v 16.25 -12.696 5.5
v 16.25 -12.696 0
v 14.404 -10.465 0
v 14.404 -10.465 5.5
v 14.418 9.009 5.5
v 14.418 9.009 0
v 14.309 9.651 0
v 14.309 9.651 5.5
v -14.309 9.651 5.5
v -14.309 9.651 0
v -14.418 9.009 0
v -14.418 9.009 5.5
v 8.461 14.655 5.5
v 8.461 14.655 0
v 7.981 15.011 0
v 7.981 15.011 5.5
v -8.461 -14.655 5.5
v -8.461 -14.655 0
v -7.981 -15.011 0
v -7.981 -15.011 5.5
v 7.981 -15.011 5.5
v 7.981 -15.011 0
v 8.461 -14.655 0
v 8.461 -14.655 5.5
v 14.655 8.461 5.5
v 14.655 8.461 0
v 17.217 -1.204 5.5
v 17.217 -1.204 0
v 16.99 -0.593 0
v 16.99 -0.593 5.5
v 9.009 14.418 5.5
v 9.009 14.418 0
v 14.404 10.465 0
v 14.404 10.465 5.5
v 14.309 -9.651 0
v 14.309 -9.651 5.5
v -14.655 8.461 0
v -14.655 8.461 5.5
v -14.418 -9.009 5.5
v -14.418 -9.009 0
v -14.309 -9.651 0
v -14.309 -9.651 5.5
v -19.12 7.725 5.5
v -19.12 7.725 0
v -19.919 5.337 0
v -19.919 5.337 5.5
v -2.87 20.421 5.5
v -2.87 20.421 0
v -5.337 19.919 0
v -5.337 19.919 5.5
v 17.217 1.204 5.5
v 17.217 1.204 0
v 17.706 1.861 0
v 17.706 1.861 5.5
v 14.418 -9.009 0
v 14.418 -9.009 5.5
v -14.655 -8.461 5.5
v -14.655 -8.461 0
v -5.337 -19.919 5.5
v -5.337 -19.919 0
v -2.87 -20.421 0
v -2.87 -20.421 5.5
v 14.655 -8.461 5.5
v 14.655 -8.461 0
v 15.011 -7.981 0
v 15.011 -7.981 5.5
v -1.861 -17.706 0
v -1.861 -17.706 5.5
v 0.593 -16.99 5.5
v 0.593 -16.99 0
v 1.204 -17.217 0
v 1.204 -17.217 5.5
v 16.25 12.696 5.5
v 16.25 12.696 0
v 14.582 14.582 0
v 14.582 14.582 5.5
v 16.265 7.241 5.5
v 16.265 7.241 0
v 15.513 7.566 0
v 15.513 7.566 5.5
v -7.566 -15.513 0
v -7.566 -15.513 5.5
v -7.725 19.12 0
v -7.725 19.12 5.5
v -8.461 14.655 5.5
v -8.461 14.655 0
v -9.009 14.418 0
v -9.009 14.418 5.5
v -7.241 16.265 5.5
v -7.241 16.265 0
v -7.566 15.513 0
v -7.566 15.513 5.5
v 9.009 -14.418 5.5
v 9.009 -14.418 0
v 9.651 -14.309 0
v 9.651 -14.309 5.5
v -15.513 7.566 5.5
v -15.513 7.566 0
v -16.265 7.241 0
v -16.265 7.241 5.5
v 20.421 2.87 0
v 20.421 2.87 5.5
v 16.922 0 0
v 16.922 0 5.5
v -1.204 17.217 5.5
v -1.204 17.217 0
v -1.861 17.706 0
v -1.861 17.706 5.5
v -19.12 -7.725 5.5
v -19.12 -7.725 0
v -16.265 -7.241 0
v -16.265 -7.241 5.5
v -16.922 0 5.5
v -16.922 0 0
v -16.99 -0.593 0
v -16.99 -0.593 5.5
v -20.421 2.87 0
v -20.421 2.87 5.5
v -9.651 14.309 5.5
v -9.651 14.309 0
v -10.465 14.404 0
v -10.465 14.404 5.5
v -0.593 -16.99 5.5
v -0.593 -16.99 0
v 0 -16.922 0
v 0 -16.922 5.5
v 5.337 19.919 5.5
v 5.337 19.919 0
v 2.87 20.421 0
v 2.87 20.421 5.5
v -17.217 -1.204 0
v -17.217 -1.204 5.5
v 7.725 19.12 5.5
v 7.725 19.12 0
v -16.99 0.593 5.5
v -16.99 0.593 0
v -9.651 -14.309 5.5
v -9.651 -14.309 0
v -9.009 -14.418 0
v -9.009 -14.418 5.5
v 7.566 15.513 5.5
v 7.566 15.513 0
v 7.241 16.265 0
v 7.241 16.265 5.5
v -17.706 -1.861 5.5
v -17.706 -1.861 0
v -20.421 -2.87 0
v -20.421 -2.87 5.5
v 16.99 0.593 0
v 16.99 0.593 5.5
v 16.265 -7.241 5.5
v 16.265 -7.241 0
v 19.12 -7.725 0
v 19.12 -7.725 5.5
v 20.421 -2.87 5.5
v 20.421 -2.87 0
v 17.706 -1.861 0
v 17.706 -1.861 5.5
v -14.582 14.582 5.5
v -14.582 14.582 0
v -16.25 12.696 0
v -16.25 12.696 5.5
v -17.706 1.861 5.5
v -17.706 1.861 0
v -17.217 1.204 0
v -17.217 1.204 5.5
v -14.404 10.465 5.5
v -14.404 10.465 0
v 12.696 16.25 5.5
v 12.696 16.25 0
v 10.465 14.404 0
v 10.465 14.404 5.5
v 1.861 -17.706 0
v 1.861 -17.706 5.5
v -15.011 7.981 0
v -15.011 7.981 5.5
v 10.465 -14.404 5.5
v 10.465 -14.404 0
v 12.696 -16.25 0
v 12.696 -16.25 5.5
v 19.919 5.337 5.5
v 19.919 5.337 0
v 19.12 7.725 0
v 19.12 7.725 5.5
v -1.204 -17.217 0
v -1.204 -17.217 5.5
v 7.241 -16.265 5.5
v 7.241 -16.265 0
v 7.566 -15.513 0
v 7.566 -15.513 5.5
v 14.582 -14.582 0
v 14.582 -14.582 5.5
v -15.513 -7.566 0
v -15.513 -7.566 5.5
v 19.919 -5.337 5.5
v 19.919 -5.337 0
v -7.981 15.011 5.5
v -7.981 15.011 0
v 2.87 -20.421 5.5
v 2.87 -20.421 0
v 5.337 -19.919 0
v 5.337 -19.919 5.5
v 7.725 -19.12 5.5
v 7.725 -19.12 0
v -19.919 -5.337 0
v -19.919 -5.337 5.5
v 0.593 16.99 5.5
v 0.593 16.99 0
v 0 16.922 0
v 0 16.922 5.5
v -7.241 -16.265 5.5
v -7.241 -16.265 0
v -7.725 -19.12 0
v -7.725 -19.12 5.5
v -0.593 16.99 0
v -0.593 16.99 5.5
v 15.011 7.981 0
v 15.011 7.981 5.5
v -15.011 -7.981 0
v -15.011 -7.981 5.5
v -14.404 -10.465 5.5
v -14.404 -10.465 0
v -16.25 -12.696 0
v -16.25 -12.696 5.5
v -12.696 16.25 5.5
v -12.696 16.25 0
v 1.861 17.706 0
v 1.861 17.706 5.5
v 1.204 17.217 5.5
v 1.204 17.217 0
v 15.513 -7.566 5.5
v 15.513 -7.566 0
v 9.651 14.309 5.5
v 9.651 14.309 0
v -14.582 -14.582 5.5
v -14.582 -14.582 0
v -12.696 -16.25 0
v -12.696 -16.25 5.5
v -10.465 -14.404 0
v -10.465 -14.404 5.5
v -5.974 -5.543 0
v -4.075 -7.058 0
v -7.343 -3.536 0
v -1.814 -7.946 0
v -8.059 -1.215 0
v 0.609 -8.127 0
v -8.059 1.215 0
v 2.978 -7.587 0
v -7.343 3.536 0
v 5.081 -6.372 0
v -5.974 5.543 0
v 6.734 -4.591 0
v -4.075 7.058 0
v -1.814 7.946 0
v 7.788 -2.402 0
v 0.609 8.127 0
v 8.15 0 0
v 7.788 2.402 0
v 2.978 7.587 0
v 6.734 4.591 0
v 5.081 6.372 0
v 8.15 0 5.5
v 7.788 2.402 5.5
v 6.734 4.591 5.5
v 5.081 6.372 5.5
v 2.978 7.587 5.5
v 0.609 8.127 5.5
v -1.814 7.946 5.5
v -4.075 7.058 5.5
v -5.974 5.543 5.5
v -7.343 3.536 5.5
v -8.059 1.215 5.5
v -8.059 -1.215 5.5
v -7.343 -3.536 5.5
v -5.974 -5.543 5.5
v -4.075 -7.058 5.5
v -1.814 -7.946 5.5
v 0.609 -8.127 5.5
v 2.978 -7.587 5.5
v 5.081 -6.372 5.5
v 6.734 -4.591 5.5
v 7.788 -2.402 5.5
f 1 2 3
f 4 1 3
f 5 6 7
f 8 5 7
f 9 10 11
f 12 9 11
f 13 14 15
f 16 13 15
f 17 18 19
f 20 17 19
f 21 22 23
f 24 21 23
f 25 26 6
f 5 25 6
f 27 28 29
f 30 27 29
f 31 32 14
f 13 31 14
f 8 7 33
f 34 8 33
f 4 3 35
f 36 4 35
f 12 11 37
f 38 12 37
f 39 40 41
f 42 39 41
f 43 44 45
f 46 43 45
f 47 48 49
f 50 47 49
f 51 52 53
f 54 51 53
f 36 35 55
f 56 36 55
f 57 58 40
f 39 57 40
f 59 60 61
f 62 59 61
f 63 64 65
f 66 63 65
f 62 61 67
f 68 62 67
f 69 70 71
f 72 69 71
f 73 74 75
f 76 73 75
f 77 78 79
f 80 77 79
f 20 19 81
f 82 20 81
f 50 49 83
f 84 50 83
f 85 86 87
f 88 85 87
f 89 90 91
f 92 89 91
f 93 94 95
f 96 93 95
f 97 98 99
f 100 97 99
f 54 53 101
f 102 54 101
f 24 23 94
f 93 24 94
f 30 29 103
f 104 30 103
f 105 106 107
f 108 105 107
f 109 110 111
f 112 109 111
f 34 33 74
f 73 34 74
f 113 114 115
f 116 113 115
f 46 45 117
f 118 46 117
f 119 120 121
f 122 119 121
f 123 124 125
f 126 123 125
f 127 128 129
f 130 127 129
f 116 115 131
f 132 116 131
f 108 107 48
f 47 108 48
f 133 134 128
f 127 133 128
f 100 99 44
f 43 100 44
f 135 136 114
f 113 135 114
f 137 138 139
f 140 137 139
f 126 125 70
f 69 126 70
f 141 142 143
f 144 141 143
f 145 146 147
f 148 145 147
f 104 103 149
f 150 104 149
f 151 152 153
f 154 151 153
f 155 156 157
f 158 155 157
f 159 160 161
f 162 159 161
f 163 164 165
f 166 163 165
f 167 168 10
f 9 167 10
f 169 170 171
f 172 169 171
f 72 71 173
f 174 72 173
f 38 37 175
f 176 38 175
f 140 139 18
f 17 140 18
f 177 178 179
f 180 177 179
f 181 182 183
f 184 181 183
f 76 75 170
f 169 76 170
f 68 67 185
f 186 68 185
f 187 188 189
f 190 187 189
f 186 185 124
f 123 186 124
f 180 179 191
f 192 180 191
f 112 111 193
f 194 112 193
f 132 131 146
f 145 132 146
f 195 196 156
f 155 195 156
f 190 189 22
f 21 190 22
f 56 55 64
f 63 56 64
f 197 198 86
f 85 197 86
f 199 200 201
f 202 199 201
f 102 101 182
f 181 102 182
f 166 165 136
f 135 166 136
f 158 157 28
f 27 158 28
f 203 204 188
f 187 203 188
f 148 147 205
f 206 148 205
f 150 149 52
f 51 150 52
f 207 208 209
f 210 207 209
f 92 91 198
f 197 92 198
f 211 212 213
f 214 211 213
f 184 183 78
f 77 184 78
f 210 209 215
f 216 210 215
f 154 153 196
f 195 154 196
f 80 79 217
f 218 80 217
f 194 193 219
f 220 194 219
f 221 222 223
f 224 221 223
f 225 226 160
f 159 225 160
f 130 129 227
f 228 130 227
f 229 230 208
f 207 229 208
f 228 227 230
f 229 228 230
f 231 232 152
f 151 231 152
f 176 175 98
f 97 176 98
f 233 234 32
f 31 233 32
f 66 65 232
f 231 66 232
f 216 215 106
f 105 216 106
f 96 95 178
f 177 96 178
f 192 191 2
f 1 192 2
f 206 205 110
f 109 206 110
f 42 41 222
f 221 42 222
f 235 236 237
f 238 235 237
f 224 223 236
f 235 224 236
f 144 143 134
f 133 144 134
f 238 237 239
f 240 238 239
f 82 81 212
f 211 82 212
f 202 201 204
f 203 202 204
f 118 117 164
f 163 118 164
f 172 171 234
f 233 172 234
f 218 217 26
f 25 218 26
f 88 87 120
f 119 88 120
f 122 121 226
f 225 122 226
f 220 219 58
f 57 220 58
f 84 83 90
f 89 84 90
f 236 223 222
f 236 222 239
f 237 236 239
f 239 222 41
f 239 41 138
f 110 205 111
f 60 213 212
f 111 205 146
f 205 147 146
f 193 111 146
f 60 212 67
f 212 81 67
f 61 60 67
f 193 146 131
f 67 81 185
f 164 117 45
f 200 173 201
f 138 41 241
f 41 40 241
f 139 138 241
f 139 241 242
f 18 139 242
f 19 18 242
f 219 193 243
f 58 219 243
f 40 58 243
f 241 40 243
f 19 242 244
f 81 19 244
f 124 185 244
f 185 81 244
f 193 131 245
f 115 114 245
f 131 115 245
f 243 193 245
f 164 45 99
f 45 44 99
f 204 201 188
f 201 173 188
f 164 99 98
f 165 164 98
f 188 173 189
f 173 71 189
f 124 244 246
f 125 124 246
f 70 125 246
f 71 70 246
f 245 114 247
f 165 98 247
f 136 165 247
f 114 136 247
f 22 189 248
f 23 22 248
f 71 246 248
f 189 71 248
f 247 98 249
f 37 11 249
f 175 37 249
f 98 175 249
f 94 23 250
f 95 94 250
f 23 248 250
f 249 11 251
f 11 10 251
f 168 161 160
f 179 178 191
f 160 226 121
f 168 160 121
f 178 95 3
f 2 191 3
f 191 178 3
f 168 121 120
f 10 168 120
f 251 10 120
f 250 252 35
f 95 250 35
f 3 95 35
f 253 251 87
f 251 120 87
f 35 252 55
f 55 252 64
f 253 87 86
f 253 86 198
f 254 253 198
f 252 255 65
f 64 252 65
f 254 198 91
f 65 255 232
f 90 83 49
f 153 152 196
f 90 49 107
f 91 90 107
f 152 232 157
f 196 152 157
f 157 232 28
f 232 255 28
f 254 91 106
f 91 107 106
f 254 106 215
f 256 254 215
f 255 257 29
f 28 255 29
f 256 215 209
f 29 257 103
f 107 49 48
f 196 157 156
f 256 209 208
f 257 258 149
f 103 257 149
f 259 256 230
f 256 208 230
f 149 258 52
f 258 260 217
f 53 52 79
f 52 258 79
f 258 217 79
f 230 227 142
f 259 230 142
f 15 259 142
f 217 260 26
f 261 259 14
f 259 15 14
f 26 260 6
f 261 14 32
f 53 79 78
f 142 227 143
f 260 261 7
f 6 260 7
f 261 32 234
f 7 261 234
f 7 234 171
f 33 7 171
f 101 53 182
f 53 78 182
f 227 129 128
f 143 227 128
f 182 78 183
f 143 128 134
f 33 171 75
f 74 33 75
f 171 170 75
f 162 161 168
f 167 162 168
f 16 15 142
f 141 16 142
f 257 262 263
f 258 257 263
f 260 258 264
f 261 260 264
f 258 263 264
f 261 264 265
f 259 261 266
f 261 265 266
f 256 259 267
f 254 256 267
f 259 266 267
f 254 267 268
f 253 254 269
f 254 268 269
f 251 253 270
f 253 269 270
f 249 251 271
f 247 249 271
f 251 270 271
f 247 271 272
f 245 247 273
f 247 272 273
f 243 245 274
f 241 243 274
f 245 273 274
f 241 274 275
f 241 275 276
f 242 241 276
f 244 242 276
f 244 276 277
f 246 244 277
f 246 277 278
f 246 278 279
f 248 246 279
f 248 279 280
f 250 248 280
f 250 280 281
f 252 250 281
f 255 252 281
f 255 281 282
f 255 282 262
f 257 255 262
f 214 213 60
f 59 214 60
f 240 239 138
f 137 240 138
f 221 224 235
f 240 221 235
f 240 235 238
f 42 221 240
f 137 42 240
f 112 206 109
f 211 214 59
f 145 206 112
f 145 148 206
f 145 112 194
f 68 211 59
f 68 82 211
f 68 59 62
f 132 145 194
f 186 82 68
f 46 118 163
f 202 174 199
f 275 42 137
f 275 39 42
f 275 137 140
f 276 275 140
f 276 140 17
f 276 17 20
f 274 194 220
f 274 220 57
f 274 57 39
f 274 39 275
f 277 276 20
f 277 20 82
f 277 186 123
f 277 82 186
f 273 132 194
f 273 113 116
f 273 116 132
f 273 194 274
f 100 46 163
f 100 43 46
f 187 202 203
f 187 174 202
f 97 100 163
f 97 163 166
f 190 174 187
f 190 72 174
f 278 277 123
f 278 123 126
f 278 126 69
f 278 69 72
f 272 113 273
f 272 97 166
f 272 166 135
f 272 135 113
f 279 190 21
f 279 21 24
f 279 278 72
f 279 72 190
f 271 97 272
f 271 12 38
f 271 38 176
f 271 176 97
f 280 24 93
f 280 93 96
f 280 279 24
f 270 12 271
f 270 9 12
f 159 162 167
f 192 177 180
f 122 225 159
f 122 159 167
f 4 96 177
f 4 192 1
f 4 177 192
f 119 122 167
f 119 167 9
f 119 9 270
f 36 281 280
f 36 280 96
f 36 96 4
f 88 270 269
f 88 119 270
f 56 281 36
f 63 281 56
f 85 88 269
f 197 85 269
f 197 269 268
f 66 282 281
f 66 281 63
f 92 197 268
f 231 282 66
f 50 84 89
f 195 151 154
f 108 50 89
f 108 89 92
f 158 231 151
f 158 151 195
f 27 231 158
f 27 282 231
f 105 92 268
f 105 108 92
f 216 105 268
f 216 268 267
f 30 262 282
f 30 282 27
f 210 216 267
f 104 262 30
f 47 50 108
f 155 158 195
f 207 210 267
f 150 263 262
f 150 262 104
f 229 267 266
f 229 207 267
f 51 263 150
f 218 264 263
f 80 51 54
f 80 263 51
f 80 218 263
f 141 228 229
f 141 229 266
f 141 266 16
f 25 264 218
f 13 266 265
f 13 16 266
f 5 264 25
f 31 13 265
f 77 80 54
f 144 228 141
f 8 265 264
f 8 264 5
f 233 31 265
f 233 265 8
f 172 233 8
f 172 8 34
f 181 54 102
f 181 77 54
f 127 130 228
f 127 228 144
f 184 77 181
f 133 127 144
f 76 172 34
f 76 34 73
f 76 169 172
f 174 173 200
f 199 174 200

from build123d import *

# Parameters (mm, degrees)
ROLLER_SEATING_TOOTH_PROFILE_DEPTH = 5.5
SKETCH_2_R                         = 8.15
THROUGH_SHAFT_BORE_DEPTH           = 30.398963933


with BuildPart() as part:
    # 草图1 → Roller_seating_tooth_profile (new body)
    with BuildSketch(Plane.XY):
        Polygon((19.919196173, -5.337332529), (20.421178717, -2.870009502), (17.706188737, -1.860995427), (17.217421057, -1.203959364), (16.990472298, -0.593320367), (16.921869331, 0), (16.990472298, 0.593320367), (17.217421057, 1.203959364), (17.706188737, 1.860995427), (20.421178717, 2.870009502), (19.919196173, 5.337332529), (19.120264295, 7.72508822), (16.264506963, 7.241425053), (15.512703705, 7.566051134), (15.010840815, 7.981405639), (14.65476872, 8.460934666), (14.417520449, 9.009066659), (14.308744341, 9.651369923), (14.403511537, 10.464763684), (16.250254793, 12.696090496), (14.581863645, 14.581863645), (12.696090496, 16.250254793), (10.464763684, 14.403511537), (9.651369923, 14.308744341), (9.009066659, 14.417520449), (8.460934666, 14.65476872), (7.981405639, 15.010840815), (7.566051134, 15.512703705), (7.241425053, 16.264506963), (7.72508822, 19.120264295), (5.337332529, 19.919196173), (2.870009502, 20.421178717), (1.860995427, 17.706188737), (1.203959364, 17.217421057), (0.593320367, 16.990472298), (0, 16.921869331), (-0.593320367, 16.990472298), (-1.203959364, 17.217421057), (-1.860995427, 17.706188737), (-2.870009502, 20.421178717), (-5.337332529, 19.919196173), (-7.72508822, 19.120264295), (-7.241425053, 16.264506963), (-7.566051134, 15.512703705), (-7.981405639, 15.010840815), (-8.460934666, 14.65476872), (-9.009066659, 14.417520449), (-9.651369923, 14.308744341), (-10.464763684, 14.403511537), (-12.696090496, 16.250254793), (-14.581863645, 14.581863645), (-16.250254793, 12.696090496), (-14.403511537, 10.464763684), (-14.308744341, 9.651369923), (-14.417520449, 9.009066659), (-14.65476872, 8.460934666), (-15.010840815, 7.981405639), (-15.512703705, 7.566051134), (-16.264506963, 7.241425053), (-19.120264295, 7.72508822), (-19.919196173, 5.337332529), (-20.421178717, 2.870009502), (-17.706188737, 1.860995427), (-17.217421057, 1.203959364), (-16.990472298, 0.593320367), (-16.921869331, 0), (-16.990472298, -0.593320367), (-17.217421057, -1.203959364), (-17.706188737, -1.860995427), (-20.421178717, -2.870009502), (-19.919196173, -5.337332529), (-19.120264295, -7.72508822), (-16.264506963, -7.241425053), (-15.512703705, -7.566051134), (-15.010840815, -7.981405639), (-14.65476872, -8.460934666), (-14.417520449, -9.009066659), (-14.308744341, -9.651369923), (-14.403511537, -10.464763684), (-16.250254793, -12.696090496), (-14.581863645, -14.581863645), (-12.696090496, -16.250254793), (-10.464763684, -14.403511537), (-9.651369923, -14.308744341), (-9.009066659, -14.417520449), (-8.460934666, -14.65476872), (-7.981405639, -15.010840815), (-7.566051134, -15.512703705), (-7.241425053, -16.264506963), (-7.72508822, -19.120264295), (-5.337332529, -19.919196173), (-2.870009502, -20.421178717), (-1.860995427, -17.706188737), (-1.203959364, -17.217421057), (-0.593320367, -16.990472298), (0, -16.921869331), (0.593320367, -16.990472298), (1.203959364, -17.217421057), (1.860995427, -17.706188737), (2.870009502, -20.421178717), (5.337332529, -19.919196173), (7.72508822, -19.120264295), (7.241425053, -16.264506963), (7.566051134, -15.512703705), (7.981405639, -15.010840815), (8.460934666, -14.65476872), (9.009066659, -14.417520449), (9.651369923, -14.308744341), (10.464763684, -14.403511537), (12.696090496, -16.250254793), (14.581863645, -14.581863645), (16.250254793, -12.696090496), (14.403511537, -10.464763684), (14.308744341, -9.651369923), (14.417520449, -9.009066659), (14.65476872, -8.460934666), (15.010840815, -7.981405639), (15.512703705, -7.566051134), (16.264506963, -7.241425053), (19.120264295, -7.72508822), align=None)
    extrude(amount=ROLLER_SEATING_TOOTH_PROFILE_DEPTH)

    # 草图2 → Through_shaft_bore (cut, through all)
    with BuildSketch(Plane.XY.offset(5.5)):
        Circle(SKETCH_2_R)
    extrude(amount=-THROUGH_SHAFT_BORE_DEPTH, mode=Mode.SUBTRACT)


solid = part.part
